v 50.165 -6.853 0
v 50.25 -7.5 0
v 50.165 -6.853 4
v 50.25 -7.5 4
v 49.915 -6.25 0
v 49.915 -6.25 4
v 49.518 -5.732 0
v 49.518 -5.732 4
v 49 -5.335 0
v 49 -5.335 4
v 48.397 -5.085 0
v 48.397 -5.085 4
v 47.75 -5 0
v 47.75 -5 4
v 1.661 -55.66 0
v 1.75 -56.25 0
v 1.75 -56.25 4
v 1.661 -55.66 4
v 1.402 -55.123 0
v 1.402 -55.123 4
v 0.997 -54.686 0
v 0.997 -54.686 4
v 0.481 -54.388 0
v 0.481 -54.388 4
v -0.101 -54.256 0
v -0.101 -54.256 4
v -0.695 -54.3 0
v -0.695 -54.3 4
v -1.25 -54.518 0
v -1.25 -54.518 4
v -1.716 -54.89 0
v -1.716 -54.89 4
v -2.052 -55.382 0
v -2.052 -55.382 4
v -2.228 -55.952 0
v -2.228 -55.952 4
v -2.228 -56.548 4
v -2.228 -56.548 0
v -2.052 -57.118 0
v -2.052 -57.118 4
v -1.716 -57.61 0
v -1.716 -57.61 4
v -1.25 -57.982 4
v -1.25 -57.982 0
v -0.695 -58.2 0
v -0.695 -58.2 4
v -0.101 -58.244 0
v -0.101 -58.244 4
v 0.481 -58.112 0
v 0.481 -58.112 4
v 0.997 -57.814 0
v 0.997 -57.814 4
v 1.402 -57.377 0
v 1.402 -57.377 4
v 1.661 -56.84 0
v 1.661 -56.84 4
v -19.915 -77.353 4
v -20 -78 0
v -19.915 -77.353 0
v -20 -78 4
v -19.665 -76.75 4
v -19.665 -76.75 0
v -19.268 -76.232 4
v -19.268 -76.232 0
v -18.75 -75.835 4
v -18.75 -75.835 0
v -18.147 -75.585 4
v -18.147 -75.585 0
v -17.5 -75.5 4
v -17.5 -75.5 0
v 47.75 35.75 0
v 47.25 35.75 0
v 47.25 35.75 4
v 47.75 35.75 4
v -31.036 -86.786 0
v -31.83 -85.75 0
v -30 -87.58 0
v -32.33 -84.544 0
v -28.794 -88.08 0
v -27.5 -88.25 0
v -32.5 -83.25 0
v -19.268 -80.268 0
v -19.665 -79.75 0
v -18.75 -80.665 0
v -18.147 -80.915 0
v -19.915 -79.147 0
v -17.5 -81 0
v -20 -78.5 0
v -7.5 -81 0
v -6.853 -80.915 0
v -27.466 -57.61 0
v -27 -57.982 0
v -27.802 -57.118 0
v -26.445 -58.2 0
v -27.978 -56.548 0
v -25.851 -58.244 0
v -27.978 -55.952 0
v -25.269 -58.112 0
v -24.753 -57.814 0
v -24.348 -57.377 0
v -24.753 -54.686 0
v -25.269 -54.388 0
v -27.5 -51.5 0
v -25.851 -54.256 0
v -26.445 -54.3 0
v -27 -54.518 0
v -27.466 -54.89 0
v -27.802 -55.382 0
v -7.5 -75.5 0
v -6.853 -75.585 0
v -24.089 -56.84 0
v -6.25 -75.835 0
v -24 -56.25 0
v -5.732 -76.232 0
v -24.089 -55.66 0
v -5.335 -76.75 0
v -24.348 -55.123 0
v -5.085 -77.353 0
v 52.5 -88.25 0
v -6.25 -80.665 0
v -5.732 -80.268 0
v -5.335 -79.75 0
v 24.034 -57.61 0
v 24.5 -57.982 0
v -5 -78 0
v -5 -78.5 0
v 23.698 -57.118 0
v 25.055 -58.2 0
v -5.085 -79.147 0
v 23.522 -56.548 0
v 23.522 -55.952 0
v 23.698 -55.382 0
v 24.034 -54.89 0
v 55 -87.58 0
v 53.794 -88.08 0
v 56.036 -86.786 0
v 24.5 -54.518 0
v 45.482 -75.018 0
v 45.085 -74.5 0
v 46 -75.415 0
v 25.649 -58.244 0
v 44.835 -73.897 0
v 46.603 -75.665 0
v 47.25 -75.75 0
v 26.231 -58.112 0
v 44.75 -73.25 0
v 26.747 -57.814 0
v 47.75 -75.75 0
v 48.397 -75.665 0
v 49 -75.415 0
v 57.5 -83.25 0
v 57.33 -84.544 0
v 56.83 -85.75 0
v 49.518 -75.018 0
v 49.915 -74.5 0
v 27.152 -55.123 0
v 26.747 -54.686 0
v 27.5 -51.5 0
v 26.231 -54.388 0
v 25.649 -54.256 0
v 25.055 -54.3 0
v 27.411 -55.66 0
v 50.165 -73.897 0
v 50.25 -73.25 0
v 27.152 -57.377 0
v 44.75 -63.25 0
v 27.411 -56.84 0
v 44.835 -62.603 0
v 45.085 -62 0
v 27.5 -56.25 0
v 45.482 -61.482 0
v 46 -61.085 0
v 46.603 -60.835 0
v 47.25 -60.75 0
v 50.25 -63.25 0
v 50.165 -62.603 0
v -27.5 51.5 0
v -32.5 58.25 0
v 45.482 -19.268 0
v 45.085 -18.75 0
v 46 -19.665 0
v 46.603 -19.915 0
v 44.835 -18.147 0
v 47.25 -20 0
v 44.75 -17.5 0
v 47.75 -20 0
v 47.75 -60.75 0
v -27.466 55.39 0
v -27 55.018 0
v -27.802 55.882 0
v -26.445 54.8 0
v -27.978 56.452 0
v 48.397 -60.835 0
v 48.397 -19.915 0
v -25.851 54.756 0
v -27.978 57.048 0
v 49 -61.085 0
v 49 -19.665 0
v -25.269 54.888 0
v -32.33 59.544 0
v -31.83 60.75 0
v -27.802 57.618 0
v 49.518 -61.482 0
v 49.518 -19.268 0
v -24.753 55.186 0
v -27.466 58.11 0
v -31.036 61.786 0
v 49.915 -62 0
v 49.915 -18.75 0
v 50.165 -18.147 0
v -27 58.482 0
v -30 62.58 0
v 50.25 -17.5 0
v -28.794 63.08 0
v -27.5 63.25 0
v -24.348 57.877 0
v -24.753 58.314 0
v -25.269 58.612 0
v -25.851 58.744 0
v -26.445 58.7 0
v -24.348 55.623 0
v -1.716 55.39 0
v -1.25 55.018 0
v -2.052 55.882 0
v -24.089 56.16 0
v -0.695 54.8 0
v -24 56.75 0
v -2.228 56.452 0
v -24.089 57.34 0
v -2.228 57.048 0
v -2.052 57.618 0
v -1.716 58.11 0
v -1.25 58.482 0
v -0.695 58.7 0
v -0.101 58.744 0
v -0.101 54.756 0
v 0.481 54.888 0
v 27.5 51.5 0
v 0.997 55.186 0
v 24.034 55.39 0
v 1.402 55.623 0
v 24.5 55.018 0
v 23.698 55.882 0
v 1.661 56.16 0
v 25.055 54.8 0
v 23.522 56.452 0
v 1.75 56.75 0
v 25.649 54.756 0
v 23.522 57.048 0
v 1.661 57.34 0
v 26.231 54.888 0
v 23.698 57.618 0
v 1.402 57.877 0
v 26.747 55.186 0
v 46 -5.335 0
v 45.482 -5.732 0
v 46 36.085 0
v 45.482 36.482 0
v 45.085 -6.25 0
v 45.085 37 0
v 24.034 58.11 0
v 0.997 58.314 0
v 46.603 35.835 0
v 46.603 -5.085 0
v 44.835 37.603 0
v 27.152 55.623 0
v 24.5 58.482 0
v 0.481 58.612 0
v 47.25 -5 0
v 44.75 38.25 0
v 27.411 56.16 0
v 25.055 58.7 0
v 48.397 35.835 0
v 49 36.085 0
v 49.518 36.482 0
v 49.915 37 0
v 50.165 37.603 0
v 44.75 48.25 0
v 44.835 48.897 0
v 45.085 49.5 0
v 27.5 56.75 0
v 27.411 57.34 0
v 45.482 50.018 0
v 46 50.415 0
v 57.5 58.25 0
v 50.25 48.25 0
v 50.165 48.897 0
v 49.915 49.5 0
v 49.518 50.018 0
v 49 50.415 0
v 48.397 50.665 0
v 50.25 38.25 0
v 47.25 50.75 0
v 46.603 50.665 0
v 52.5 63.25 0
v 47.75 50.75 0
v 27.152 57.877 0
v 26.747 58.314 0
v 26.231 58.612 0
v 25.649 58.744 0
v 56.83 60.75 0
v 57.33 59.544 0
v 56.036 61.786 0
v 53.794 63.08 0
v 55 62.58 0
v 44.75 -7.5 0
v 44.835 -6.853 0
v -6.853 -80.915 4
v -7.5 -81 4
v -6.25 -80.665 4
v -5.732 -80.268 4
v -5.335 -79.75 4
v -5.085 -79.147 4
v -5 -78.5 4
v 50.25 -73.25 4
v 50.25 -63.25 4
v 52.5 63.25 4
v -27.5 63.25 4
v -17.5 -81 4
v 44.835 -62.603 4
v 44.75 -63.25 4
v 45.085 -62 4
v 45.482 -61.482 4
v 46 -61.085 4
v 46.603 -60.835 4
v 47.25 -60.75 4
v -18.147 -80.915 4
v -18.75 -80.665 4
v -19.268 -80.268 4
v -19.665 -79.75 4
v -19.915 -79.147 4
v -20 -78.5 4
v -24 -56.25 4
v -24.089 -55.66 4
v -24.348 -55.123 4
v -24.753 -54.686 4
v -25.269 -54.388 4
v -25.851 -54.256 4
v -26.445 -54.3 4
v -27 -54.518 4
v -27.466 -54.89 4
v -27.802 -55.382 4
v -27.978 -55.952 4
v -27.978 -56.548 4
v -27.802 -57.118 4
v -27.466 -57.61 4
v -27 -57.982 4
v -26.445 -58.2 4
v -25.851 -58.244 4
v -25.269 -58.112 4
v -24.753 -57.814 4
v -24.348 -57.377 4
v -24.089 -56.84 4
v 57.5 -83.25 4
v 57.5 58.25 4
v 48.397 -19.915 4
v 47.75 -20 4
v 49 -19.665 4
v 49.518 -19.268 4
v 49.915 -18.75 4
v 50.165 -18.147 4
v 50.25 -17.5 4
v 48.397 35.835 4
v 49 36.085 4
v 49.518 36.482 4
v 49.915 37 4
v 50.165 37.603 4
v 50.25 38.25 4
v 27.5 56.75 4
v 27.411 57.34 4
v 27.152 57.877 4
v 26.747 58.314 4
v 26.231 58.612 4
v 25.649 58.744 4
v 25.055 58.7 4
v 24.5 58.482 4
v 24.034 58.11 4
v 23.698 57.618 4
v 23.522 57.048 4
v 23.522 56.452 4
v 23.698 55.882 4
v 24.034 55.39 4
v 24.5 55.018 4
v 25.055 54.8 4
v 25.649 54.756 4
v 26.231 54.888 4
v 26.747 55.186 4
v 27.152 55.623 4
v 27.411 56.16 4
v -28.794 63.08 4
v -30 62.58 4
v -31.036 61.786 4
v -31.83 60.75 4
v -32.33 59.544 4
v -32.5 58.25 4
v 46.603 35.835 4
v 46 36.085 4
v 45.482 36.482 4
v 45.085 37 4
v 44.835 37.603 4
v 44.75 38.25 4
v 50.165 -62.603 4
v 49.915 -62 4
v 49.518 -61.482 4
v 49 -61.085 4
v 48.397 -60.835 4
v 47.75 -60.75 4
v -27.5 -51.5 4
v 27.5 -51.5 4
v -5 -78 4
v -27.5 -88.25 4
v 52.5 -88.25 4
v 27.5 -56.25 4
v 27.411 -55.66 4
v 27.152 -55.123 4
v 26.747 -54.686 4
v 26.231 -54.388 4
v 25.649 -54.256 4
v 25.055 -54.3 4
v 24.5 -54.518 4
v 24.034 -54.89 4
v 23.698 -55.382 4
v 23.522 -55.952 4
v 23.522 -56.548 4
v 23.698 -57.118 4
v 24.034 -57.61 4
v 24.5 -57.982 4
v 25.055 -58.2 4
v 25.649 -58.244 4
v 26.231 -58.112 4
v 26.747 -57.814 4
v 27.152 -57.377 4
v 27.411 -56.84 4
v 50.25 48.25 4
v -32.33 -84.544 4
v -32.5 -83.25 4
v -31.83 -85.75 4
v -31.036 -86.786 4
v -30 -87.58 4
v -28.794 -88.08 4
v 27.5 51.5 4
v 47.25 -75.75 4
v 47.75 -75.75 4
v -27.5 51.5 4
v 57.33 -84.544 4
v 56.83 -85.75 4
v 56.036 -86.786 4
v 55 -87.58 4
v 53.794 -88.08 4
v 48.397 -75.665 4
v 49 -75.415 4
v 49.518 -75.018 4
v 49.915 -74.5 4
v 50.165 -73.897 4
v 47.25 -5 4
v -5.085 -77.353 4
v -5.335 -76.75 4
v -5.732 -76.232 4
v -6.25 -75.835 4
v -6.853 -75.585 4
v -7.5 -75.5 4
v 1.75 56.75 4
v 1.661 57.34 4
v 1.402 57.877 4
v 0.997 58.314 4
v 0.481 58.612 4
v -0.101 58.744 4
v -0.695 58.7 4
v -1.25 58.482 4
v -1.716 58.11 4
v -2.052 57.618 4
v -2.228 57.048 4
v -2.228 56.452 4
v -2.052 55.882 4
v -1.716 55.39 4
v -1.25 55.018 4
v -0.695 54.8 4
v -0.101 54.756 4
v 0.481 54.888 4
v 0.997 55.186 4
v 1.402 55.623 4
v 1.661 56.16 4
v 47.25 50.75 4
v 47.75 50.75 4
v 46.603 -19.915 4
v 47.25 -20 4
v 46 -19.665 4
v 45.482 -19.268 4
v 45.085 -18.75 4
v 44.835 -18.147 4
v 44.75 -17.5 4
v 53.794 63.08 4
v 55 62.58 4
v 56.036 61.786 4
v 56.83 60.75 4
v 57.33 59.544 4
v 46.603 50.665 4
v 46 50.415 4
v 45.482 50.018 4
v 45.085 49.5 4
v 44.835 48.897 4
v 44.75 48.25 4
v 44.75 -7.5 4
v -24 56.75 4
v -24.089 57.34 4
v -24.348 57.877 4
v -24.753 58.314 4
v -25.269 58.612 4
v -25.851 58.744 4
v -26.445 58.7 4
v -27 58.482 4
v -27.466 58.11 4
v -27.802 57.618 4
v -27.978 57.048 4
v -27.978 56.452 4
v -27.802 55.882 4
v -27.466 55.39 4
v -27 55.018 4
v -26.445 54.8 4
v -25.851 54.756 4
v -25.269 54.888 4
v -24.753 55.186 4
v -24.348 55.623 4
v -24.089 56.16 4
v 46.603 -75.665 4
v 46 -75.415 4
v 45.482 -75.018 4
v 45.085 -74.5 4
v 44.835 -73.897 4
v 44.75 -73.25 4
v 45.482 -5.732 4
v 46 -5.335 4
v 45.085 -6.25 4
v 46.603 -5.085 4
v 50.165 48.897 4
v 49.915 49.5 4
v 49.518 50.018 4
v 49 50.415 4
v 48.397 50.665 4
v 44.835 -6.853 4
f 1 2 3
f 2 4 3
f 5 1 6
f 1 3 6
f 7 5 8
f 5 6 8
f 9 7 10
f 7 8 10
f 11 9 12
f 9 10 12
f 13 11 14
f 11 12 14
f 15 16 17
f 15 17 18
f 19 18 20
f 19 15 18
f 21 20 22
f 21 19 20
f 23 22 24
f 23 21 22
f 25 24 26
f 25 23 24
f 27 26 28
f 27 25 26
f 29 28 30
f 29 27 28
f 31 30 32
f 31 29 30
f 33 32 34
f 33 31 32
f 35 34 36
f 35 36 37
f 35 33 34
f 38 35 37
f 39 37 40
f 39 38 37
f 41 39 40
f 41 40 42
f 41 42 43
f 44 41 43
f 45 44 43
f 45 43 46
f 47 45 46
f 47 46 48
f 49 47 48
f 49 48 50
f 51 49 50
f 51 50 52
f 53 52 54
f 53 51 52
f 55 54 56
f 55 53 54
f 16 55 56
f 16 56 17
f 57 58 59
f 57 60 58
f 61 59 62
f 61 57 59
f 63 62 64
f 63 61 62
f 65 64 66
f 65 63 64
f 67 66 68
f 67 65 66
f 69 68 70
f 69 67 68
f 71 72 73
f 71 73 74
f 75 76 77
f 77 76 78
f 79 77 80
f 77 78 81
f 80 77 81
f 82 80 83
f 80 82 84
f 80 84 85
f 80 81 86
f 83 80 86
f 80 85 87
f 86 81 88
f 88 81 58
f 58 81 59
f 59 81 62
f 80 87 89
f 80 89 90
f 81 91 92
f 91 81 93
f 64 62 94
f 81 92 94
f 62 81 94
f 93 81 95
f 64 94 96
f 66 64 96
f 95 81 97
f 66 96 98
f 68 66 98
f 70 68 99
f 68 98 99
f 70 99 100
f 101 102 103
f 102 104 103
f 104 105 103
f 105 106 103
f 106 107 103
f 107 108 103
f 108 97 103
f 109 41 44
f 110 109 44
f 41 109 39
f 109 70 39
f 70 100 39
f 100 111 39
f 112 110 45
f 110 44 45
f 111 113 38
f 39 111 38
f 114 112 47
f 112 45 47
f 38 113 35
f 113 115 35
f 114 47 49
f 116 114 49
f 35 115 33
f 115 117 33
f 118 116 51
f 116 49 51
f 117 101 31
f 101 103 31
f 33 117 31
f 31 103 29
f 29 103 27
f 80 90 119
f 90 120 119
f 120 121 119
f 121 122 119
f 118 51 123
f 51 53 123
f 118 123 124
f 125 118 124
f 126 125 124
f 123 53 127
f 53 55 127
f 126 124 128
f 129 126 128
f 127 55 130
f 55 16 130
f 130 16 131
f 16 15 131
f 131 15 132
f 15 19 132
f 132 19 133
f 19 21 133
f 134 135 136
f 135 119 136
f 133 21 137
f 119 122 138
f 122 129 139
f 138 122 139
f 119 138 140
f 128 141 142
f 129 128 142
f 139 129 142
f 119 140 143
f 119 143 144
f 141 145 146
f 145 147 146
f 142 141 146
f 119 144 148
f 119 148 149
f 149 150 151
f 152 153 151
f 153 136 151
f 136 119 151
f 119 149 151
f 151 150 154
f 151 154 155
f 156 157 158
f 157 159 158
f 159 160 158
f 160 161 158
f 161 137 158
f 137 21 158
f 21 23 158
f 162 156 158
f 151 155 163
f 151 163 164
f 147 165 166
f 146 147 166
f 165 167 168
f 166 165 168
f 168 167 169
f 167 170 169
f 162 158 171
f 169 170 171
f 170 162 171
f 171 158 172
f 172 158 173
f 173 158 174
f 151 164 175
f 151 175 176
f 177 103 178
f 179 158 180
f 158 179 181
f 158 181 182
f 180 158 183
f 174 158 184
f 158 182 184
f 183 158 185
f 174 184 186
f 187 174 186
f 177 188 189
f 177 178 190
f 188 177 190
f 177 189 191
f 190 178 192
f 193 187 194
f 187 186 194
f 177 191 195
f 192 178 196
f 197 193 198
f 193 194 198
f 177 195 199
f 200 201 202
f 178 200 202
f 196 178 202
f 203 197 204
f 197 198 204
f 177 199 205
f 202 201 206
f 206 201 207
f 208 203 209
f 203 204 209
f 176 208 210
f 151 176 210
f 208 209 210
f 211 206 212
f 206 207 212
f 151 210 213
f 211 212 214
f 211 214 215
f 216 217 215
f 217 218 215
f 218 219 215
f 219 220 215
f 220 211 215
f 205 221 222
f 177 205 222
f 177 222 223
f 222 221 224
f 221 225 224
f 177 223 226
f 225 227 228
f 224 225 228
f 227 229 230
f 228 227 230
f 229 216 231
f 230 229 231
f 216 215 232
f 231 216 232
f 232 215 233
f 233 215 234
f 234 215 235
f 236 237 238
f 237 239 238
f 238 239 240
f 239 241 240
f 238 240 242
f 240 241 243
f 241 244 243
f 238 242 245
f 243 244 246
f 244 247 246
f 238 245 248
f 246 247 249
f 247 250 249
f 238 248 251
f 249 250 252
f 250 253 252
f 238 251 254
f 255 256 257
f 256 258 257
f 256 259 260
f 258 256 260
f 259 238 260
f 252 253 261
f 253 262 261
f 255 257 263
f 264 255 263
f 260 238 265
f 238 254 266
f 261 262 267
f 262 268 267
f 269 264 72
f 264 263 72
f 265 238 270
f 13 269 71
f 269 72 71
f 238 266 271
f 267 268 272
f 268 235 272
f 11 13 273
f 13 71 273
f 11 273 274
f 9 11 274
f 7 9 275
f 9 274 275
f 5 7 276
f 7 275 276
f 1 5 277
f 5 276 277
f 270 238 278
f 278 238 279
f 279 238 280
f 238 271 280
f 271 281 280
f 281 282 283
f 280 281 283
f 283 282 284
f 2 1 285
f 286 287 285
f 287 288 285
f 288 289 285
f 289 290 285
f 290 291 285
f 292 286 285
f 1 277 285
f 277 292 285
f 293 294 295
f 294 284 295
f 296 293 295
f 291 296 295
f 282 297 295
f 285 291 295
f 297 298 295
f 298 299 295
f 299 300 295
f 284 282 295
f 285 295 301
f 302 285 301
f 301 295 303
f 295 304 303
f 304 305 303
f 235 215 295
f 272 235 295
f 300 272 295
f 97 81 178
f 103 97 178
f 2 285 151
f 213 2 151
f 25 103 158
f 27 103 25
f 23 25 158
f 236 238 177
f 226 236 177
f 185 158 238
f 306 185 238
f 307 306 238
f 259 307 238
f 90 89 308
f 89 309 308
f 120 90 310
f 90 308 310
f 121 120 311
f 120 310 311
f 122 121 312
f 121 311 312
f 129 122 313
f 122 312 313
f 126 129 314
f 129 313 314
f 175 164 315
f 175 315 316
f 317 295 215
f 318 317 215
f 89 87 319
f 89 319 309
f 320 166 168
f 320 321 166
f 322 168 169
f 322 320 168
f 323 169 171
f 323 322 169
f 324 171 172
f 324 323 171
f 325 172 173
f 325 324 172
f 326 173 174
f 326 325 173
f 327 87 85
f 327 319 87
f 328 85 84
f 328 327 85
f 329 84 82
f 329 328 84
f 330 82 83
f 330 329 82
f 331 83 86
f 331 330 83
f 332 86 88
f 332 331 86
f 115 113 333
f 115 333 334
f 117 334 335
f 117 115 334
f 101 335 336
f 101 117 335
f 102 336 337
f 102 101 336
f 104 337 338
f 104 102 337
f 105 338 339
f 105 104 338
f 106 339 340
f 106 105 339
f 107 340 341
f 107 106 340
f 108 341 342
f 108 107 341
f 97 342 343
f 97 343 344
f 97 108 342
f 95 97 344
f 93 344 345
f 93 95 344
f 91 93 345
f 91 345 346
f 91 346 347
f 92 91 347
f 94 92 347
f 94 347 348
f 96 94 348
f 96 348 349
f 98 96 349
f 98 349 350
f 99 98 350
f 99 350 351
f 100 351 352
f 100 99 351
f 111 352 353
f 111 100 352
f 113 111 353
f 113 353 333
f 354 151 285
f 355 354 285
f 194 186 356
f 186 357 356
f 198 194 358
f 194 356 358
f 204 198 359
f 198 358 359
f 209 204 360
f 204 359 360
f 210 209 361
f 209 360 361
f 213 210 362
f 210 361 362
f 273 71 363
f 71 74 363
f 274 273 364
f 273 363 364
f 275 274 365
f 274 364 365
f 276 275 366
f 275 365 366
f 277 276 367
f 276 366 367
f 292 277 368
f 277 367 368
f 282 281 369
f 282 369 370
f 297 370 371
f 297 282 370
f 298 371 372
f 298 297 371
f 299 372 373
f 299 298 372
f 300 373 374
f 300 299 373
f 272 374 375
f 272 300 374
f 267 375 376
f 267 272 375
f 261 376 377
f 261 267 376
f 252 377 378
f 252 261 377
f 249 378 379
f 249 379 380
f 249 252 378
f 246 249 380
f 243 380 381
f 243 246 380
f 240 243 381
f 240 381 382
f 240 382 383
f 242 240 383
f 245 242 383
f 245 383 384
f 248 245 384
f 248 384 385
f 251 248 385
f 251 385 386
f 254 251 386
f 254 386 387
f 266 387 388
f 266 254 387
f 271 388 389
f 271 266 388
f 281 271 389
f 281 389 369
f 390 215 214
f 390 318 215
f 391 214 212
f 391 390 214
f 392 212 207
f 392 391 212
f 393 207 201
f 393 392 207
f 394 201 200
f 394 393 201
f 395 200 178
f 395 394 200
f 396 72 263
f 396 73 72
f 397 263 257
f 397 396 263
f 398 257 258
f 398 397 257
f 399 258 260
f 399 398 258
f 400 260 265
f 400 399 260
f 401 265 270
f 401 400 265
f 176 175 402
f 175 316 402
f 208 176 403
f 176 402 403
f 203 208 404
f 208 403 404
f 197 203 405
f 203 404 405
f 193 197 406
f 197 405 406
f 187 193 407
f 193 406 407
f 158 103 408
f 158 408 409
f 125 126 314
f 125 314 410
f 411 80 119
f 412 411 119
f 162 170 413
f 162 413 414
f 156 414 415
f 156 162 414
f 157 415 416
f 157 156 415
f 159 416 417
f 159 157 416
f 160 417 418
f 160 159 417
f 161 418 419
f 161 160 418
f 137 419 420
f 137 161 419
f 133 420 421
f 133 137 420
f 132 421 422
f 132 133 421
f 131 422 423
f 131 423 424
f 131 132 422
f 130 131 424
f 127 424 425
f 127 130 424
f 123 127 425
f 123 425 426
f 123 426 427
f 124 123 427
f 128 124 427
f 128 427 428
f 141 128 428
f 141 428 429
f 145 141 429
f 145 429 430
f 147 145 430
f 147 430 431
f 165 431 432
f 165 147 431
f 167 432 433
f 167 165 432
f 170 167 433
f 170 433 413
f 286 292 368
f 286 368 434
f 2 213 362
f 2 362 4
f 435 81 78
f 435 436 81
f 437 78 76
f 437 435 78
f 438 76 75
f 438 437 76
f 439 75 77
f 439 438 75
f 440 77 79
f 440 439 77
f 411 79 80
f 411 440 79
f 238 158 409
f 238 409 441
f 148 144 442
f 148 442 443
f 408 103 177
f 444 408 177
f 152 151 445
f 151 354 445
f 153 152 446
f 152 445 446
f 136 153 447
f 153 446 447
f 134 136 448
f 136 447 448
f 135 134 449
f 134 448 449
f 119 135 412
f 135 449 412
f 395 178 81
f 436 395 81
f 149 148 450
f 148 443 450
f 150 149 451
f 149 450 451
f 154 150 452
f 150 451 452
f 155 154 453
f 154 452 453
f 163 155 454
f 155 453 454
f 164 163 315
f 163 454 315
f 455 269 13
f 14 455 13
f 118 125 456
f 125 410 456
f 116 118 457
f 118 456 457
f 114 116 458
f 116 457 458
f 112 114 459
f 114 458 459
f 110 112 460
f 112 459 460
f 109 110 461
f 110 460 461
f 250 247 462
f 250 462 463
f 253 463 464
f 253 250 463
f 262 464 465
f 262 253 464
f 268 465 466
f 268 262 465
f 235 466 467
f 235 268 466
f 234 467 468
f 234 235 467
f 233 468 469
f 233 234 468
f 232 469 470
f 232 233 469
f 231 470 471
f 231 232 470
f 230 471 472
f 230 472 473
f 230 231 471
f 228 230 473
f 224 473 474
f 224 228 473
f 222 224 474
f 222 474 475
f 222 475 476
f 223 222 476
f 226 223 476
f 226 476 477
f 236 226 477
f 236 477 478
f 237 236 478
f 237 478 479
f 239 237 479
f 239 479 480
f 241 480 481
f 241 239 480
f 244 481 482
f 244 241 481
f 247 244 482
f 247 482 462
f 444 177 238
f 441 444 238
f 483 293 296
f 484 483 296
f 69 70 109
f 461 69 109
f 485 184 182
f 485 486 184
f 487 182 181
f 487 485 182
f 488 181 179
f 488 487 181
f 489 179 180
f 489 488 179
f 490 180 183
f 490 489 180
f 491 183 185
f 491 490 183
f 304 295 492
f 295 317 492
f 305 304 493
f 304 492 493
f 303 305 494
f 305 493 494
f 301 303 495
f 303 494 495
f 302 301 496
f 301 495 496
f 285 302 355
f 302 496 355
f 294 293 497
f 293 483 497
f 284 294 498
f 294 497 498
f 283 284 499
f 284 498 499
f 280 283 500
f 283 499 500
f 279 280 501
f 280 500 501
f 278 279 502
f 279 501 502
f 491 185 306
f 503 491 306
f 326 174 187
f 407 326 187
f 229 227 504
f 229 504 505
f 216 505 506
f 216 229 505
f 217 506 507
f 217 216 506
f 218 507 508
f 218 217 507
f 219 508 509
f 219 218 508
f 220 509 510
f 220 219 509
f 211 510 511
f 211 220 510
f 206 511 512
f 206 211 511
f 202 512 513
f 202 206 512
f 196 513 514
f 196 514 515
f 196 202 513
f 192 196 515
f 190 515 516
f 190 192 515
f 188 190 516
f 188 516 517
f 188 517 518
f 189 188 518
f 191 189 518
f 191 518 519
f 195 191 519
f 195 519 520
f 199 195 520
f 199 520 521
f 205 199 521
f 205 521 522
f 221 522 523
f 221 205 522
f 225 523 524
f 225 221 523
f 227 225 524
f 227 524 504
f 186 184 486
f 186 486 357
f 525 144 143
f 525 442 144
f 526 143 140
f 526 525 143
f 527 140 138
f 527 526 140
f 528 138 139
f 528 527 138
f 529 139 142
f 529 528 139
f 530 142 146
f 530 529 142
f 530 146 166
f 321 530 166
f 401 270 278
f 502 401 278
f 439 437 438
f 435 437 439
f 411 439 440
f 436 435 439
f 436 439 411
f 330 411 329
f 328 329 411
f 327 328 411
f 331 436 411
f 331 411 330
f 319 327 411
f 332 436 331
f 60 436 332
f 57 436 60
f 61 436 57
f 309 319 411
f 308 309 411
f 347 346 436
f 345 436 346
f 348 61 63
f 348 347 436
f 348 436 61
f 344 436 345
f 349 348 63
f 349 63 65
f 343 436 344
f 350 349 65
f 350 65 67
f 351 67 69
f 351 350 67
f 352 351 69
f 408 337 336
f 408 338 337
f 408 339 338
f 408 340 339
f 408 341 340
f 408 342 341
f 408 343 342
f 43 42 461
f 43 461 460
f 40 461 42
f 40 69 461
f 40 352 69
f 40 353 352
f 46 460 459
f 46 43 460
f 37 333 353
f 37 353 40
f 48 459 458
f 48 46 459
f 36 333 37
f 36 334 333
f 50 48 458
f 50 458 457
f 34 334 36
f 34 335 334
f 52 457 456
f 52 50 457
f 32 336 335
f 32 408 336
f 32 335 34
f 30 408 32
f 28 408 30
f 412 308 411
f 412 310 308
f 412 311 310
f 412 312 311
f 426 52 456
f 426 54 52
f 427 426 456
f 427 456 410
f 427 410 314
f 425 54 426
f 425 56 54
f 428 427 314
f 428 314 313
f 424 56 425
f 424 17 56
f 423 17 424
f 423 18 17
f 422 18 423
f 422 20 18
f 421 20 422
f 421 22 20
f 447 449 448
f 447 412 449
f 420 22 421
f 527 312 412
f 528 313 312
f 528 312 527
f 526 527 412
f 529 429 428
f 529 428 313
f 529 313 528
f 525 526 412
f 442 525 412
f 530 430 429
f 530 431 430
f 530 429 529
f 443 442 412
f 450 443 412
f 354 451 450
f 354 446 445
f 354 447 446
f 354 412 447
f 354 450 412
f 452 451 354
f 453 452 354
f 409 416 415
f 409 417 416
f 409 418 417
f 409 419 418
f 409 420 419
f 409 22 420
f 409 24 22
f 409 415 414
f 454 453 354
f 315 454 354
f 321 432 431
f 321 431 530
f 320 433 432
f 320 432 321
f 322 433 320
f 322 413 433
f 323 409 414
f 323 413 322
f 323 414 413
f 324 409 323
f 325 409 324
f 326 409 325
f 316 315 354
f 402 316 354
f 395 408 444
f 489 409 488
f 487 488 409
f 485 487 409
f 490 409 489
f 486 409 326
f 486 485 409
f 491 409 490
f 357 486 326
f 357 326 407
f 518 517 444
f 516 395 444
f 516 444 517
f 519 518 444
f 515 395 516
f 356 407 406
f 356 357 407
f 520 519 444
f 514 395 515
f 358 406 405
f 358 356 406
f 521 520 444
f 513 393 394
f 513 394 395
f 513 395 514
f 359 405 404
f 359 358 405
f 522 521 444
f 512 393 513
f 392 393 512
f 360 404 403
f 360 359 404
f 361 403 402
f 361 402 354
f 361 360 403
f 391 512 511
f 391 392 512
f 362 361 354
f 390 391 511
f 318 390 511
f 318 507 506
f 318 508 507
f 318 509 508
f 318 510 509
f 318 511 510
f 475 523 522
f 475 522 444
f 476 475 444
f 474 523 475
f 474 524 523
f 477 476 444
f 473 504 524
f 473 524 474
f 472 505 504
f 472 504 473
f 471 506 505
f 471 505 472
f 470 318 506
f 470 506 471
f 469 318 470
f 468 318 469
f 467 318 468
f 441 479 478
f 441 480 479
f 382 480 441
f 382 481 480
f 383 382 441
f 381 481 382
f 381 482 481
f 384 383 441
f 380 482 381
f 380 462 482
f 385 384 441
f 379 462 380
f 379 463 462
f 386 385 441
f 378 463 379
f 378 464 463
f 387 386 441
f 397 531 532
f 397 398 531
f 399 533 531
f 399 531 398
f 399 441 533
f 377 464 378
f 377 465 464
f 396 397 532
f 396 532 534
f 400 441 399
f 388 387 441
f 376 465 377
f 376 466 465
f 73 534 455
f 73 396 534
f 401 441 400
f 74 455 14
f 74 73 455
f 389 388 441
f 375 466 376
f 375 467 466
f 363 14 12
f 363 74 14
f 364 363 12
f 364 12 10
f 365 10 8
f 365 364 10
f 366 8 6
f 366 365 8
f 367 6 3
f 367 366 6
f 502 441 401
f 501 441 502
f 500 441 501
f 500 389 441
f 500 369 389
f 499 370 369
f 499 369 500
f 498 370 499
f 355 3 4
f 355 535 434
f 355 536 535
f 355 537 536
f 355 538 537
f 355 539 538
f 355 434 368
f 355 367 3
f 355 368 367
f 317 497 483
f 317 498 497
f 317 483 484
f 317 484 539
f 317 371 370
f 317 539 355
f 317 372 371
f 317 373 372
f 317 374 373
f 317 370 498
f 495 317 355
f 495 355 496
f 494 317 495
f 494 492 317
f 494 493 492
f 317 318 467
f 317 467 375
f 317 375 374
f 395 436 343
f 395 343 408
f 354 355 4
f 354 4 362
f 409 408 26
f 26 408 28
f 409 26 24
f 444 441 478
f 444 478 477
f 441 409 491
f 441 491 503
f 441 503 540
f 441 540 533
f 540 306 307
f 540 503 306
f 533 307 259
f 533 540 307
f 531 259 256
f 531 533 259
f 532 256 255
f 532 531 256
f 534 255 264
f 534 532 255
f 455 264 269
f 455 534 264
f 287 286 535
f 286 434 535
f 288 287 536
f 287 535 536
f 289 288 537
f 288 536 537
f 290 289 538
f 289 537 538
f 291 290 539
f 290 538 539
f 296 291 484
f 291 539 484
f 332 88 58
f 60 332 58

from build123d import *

# Parameters (mm, degrees)
F0_W     = 15
F0_H     = 5.5
F0_R     = 2
F0_W_2   = 5.5
F0_H_2   = 15
F0_W_3   = 55
F0_H_3   = 103
F1_DEPTH = 4
F2_R     = 2.5
F3_R     = 5


# Not quite as in the source:
# - a feature names something its author has since deleted; it is built from what else it names


with BuildPart() as f1:
    # F0 (on Top) → F1 (new body)
    with BuildSketch(Plane.XY):
        Polygon((57.5, 63.25), (32.5, 63.25), (-32.5, 63.25), (-32.5, -63.25), (-32.5, -88.25), (57.5, -88.25), align=None)
        with Locations((-12.5, -78.25)):
            Rectangle(F0_W, F0_H, mode=Mode.SUBTRACT)
        with Locations((-26, -56.25)):
            Circle(F0_R, mode=Mode.SUBTRACT)
        with Locations((-0.25, -56.25)):
            Circle(F0_R, mode=Mode.SUBTRACT)
        with Locations((25.5, -56.25)):
            Circle(F0_R, mode=Mode.SUBTRACT)
        with Locations((47.5, -68.25)):
            Rectangle(F0_W_2, F0_H_2, mode=Mode.SUBTRACT)
        Rectangle(F0_W_3, F0_H_3, mode=Mode.SUBTRACT)
        with Locations((-26, 56.75)):
            Circle(F0_R, mode=Mode.SUBTRACT)
        with Locations((-0.25, 56.75)):
            Circle(F0_R, mode=Mode.SUBTRACT)
        with Locations((47.5, -12.5)):
            Rectangle(F0_W_2, F0_H_2, mode=Mode.SUBTRACT)
        with Locations((25.5, 56.75)):
            Circle(F0_R, mode=Mode.SUBTRACT)
        with Locations((47.5, 43.25)):
            Rectangle(F0_W_2, F0_H_2, mode=Mode.SUBTRACT)
    extrude(amount=F1_DEPTH)

    # F2
    f2_edges = [f1.edges().sort_by_distance(p)[0] for p in [
        (-20, -81, 2),
        (-20, -75.5, 2),
        (-5, -75.5, 2),
        (-5, -81, 2),
        (50.25, -60.75, 2),
        (50.25, -75.75, 2),
        (44.75, -75.75, 2),
        (44.75, -60.75, 2),
        (44.75, -5, 2),
        (50.25, -5, 2),
        (50.25, -20, 2),
        (44.75, -20, 2),
        (44.75, 35.75, 2),
        (44.75, 50.75, 2),
        (50.25, 50.75, 2),
        (50.25, 35.75, 2),
    ]]
    fillet(f2_edges, radius=F2_R)

    # F3
    f3_edges = [f1.edges().sort_by_distance(p)[0] for p in [
        (-32.5, 63.25, 2),
        (-32.5, -88.25, 2),
        (57.5, -88.25, 2),
        (57.5, 63.25, 2),
    ]]
    fillet(f3_edges, radius=F3_R)


solid = f1.part
